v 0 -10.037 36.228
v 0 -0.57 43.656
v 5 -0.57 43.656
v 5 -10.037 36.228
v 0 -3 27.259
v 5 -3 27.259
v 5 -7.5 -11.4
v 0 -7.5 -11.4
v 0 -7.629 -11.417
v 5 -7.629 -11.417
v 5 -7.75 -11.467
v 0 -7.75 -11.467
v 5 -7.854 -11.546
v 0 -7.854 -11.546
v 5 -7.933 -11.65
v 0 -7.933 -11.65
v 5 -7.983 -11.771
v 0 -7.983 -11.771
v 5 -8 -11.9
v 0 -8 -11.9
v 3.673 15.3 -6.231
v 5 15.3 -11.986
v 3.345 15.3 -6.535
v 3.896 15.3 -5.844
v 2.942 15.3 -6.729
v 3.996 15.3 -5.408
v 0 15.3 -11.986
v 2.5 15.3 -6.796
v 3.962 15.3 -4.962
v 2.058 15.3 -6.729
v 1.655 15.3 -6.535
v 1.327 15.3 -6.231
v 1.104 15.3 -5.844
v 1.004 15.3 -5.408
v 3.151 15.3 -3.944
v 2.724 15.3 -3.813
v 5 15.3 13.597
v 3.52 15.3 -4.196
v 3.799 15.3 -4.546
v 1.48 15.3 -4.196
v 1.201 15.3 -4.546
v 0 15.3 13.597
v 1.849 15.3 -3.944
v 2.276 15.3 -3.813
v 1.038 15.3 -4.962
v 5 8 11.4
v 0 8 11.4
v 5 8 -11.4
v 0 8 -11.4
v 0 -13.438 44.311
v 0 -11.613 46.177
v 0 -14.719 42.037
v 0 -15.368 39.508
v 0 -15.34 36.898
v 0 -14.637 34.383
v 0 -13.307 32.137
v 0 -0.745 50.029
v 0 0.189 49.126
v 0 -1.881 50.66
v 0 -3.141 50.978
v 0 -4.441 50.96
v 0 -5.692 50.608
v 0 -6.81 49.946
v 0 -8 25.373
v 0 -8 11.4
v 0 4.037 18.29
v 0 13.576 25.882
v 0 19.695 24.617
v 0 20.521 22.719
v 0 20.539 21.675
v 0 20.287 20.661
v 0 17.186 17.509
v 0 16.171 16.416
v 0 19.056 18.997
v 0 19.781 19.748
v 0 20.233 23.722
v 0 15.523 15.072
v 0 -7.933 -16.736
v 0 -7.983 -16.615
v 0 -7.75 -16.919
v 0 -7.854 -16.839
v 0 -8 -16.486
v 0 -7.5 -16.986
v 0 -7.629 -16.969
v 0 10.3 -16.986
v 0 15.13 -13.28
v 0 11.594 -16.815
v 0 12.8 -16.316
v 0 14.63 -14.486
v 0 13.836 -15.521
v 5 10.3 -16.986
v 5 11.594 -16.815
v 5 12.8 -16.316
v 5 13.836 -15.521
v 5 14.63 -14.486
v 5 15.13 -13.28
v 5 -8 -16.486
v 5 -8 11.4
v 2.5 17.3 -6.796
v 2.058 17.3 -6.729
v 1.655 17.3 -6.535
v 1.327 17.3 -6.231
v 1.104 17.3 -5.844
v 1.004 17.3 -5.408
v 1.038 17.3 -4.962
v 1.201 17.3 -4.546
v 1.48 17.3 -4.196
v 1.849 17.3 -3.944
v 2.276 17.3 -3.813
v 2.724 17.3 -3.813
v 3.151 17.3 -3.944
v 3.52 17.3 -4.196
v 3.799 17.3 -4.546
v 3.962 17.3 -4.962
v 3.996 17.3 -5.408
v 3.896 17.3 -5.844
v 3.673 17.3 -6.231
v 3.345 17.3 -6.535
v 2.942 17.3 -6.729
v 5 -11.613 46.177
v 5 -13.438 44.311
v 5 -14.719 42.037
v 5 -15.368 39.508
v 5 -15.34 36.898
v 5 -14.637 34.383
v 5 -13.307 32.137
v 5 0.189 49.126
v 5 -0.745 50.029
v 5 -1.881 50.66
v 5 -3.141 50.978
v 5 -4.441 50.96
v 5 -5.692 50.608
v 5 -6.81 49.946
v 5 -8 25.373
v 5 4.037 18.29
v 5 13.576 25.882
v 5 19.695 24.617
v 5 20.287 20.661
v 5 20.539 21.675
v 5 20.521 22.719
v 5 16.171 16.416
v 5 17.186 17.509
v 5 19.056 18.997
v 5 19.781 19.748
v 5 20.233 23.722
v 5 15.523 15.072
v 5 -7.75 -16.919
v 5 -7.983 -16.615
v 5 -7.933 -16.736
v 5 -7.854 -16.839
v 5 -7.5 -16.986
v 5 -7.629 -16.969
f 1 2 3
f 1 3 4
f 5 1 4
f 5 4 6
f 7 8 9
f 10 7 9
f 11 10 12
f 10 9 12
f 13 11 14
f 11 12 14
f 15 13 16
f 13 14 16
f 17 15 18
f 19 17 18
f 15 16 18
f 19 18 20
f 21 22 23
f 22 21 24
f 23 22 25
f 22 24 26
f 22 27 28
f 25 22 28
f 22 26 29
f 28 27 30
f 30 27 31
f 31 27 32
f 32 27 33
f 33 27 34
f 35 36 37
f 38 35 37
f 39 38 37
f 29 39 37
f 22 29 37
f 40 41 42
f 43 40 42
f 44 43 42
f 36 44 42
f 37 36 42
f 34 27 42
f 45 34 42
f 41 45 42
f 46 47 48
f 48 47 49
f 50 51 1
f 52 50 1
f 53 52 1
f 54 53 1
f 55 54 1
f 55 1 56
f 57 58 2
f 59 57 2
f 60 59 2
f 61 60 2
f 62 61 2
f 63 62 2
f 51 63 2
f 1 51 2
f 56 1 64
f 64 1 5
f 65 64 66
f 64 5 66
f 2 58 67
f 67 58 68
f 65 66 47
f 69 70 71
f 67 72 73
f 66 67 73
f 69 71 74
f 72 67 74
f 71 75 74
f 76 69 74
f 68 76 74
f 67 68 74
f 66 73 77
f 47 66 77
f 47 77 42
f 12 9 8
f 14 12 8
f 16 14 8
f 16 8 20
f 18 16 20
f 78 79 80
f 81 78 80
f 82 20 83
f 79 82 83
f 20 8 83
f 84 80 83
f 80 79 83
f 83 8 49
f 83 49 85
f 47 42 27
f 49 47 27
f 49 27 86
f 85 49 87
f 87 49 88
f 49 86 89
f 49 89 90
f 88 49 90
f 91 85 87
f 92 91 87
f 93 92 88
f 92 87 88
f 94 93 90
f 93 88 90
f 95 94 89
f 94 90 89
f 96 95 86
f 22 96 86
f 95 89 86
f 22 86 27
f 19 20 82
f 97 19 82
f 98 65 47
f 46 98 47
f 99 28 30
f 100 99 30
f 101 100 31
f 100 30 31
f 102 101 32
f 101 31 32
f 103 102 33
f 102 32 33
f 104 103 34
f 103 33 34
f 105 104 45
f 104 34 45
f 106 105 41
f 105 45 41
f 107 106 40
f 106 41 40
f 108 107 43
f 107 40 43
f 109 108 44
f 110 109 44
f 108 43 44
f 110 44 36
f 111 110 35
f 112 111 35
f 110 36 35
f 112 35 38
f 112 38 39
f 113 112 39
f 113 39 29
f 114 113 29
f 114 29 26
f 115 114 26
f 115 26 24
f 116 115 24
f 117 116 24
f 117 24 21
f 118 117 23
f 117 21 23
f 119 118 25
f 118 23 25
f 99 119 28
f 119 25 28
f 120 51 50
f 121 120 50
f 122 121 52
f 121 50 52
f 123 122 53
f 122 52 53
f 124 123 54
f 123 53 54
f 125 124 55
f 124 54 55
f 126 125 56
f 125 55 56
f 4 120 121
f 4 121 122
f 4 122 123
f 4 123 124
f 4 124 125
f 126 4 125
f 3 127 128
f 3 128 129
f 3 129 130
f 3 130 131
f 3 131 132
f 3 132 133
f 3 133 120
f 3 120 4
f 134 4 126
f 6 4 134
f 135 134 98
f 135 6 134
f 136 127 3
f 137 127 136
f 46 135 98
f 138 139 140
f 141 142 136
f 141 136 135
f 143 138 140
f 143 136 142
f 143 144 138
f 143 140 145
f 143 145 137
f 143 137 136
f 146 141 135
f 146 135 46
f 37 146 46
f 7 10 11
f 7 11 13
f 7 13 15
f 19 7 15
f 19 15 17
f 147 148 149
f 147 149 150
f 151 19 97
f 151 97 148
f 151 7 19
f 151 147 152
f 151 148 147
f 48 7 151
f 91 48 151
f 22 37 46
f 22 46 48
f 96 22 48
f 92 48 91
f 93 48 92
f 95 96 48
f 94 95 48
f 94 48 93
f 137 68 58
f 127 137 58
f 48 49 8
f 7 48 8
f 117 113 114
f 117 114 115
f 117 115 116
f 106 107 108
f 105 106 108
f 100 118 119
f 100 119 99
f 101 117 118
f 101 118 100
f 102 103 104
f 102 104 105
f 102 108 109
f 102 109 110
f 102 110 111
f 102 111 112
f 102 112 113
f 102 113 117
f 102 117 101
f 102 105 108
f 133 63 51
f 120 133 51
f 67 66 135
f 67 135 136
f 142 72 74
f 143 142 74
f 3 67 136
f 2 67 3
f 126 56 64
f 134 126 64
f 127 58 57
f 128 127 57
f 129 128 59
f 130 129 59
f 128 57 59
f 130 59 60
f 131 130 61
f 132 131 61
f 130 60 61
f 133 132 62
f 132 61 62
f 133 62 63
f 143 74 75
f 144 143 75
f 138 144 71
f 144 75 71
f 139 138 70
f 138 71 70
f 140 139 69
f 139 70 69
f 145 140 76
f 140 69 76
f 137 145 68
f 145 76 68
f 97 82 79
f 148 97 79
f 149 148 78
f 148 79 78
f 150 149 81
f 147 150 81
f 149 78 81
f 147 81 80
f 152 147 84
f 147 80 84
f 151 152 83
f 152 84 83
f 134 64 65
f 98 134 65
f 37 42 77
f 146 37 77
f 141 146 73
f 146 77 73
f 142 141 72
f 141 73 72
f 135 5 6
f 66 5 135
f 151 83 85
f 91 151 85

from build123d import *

# Parameters (mm, degrees)
RESSALTO_EXTRUS_O2_DEPTH = 5
ESBO_O2_R                = 1.5
RESSALTO_EXTRUS_O3_DEPTH = 2


with BuildPart() as part:
    # Esboço1 → Ressalto-extrusão2 (new body)
    with BuildSketch(Plane(origin=(0, 0, 0), x_dir=(0, 0, -1), z_dir=(1, 0, 0))):
        with BuildLine():
            Line((11.9, -8), (16.485851709, -8))
            ThreePointArc((16.485851709, -8), (16.8394051, -7.853553391), (16.985851709, -7.5))
            Line((16.985851709, -7.5), (16.985851709, 10.3))
            ThreePointArc((16.985851709, 10.3), (15.521385615, 13.835533906), (11.985851709, 15.3))
            Line((11.985851709, 15.3), (-13.596583919, 15.3))
            ThreePointArc((-13.596583919, 15.3), (-15.768192588, 15.796210952), (-17.508770855, 17.186353684))
            Line((-17.508770855, 17.186353684), (-18.996698023, 19.055881768))
            ThreePointArc((-18.996698023, 19.055881768), (-21.674724782, 20.539376184), (-24.617364625, 19.694714264))
            Line((-24.617364625, 19.694714264), (-49.125535856, 0.18905712))
            ThreePointArc((-49.125535856, 0.18905712), (-50.977914533, -3.141239982), (-49.945591755, -6.809549569))
            Line((-49.945591755, -6.809549569), (-46.177076689, -11.612595572))
            ThreePointArc((-46.177076689, -11.612595572), (-39.507910608, -15.367707761), (-32.136832755, -13.307160494))
            Line((-32.136832755, -13.307160494), (-25.372753124, -8))
            Line((-25.372753124, -8), (-11.4, -8))
            Line((-11.4, -8), (-11.4, 8))
            Line((-11.4, 8), (11.4, 8))
            Line((11.4, 8), (11.4, -7.5))
            ThreePointArc((11.4, -7.5), (11.546446609, -7.853553391), (11.9, -8))
        make_face()
        Polygon((-27.25904201, -3), (-18.290200962, 4.037037037), (-25.882056579, 13.575936242), (-43.655854678, -0.569942233), (-36.227883057, -10.037037037), align=None, mode=Mode.SUBTRACT)
    extrude(amount=RESSALTO_EXTRUS_O2_DEPTH)

    # Esboço2 → Ressalto-extrusão3 (add)
    with BuildSketch(Plane(origin=(0, 15.3, 0), x_dir=(1, 0, 0), z_dir=(0, 1, 0))):
        with Locations(Location((2.5, 5.295851709, 0), (0, 0, 90))):
            Circle(ESBO_O2_R)
    extrude(amount=RESSALTO_EXTRUS_O3_DEPTH)


solid = part.part
